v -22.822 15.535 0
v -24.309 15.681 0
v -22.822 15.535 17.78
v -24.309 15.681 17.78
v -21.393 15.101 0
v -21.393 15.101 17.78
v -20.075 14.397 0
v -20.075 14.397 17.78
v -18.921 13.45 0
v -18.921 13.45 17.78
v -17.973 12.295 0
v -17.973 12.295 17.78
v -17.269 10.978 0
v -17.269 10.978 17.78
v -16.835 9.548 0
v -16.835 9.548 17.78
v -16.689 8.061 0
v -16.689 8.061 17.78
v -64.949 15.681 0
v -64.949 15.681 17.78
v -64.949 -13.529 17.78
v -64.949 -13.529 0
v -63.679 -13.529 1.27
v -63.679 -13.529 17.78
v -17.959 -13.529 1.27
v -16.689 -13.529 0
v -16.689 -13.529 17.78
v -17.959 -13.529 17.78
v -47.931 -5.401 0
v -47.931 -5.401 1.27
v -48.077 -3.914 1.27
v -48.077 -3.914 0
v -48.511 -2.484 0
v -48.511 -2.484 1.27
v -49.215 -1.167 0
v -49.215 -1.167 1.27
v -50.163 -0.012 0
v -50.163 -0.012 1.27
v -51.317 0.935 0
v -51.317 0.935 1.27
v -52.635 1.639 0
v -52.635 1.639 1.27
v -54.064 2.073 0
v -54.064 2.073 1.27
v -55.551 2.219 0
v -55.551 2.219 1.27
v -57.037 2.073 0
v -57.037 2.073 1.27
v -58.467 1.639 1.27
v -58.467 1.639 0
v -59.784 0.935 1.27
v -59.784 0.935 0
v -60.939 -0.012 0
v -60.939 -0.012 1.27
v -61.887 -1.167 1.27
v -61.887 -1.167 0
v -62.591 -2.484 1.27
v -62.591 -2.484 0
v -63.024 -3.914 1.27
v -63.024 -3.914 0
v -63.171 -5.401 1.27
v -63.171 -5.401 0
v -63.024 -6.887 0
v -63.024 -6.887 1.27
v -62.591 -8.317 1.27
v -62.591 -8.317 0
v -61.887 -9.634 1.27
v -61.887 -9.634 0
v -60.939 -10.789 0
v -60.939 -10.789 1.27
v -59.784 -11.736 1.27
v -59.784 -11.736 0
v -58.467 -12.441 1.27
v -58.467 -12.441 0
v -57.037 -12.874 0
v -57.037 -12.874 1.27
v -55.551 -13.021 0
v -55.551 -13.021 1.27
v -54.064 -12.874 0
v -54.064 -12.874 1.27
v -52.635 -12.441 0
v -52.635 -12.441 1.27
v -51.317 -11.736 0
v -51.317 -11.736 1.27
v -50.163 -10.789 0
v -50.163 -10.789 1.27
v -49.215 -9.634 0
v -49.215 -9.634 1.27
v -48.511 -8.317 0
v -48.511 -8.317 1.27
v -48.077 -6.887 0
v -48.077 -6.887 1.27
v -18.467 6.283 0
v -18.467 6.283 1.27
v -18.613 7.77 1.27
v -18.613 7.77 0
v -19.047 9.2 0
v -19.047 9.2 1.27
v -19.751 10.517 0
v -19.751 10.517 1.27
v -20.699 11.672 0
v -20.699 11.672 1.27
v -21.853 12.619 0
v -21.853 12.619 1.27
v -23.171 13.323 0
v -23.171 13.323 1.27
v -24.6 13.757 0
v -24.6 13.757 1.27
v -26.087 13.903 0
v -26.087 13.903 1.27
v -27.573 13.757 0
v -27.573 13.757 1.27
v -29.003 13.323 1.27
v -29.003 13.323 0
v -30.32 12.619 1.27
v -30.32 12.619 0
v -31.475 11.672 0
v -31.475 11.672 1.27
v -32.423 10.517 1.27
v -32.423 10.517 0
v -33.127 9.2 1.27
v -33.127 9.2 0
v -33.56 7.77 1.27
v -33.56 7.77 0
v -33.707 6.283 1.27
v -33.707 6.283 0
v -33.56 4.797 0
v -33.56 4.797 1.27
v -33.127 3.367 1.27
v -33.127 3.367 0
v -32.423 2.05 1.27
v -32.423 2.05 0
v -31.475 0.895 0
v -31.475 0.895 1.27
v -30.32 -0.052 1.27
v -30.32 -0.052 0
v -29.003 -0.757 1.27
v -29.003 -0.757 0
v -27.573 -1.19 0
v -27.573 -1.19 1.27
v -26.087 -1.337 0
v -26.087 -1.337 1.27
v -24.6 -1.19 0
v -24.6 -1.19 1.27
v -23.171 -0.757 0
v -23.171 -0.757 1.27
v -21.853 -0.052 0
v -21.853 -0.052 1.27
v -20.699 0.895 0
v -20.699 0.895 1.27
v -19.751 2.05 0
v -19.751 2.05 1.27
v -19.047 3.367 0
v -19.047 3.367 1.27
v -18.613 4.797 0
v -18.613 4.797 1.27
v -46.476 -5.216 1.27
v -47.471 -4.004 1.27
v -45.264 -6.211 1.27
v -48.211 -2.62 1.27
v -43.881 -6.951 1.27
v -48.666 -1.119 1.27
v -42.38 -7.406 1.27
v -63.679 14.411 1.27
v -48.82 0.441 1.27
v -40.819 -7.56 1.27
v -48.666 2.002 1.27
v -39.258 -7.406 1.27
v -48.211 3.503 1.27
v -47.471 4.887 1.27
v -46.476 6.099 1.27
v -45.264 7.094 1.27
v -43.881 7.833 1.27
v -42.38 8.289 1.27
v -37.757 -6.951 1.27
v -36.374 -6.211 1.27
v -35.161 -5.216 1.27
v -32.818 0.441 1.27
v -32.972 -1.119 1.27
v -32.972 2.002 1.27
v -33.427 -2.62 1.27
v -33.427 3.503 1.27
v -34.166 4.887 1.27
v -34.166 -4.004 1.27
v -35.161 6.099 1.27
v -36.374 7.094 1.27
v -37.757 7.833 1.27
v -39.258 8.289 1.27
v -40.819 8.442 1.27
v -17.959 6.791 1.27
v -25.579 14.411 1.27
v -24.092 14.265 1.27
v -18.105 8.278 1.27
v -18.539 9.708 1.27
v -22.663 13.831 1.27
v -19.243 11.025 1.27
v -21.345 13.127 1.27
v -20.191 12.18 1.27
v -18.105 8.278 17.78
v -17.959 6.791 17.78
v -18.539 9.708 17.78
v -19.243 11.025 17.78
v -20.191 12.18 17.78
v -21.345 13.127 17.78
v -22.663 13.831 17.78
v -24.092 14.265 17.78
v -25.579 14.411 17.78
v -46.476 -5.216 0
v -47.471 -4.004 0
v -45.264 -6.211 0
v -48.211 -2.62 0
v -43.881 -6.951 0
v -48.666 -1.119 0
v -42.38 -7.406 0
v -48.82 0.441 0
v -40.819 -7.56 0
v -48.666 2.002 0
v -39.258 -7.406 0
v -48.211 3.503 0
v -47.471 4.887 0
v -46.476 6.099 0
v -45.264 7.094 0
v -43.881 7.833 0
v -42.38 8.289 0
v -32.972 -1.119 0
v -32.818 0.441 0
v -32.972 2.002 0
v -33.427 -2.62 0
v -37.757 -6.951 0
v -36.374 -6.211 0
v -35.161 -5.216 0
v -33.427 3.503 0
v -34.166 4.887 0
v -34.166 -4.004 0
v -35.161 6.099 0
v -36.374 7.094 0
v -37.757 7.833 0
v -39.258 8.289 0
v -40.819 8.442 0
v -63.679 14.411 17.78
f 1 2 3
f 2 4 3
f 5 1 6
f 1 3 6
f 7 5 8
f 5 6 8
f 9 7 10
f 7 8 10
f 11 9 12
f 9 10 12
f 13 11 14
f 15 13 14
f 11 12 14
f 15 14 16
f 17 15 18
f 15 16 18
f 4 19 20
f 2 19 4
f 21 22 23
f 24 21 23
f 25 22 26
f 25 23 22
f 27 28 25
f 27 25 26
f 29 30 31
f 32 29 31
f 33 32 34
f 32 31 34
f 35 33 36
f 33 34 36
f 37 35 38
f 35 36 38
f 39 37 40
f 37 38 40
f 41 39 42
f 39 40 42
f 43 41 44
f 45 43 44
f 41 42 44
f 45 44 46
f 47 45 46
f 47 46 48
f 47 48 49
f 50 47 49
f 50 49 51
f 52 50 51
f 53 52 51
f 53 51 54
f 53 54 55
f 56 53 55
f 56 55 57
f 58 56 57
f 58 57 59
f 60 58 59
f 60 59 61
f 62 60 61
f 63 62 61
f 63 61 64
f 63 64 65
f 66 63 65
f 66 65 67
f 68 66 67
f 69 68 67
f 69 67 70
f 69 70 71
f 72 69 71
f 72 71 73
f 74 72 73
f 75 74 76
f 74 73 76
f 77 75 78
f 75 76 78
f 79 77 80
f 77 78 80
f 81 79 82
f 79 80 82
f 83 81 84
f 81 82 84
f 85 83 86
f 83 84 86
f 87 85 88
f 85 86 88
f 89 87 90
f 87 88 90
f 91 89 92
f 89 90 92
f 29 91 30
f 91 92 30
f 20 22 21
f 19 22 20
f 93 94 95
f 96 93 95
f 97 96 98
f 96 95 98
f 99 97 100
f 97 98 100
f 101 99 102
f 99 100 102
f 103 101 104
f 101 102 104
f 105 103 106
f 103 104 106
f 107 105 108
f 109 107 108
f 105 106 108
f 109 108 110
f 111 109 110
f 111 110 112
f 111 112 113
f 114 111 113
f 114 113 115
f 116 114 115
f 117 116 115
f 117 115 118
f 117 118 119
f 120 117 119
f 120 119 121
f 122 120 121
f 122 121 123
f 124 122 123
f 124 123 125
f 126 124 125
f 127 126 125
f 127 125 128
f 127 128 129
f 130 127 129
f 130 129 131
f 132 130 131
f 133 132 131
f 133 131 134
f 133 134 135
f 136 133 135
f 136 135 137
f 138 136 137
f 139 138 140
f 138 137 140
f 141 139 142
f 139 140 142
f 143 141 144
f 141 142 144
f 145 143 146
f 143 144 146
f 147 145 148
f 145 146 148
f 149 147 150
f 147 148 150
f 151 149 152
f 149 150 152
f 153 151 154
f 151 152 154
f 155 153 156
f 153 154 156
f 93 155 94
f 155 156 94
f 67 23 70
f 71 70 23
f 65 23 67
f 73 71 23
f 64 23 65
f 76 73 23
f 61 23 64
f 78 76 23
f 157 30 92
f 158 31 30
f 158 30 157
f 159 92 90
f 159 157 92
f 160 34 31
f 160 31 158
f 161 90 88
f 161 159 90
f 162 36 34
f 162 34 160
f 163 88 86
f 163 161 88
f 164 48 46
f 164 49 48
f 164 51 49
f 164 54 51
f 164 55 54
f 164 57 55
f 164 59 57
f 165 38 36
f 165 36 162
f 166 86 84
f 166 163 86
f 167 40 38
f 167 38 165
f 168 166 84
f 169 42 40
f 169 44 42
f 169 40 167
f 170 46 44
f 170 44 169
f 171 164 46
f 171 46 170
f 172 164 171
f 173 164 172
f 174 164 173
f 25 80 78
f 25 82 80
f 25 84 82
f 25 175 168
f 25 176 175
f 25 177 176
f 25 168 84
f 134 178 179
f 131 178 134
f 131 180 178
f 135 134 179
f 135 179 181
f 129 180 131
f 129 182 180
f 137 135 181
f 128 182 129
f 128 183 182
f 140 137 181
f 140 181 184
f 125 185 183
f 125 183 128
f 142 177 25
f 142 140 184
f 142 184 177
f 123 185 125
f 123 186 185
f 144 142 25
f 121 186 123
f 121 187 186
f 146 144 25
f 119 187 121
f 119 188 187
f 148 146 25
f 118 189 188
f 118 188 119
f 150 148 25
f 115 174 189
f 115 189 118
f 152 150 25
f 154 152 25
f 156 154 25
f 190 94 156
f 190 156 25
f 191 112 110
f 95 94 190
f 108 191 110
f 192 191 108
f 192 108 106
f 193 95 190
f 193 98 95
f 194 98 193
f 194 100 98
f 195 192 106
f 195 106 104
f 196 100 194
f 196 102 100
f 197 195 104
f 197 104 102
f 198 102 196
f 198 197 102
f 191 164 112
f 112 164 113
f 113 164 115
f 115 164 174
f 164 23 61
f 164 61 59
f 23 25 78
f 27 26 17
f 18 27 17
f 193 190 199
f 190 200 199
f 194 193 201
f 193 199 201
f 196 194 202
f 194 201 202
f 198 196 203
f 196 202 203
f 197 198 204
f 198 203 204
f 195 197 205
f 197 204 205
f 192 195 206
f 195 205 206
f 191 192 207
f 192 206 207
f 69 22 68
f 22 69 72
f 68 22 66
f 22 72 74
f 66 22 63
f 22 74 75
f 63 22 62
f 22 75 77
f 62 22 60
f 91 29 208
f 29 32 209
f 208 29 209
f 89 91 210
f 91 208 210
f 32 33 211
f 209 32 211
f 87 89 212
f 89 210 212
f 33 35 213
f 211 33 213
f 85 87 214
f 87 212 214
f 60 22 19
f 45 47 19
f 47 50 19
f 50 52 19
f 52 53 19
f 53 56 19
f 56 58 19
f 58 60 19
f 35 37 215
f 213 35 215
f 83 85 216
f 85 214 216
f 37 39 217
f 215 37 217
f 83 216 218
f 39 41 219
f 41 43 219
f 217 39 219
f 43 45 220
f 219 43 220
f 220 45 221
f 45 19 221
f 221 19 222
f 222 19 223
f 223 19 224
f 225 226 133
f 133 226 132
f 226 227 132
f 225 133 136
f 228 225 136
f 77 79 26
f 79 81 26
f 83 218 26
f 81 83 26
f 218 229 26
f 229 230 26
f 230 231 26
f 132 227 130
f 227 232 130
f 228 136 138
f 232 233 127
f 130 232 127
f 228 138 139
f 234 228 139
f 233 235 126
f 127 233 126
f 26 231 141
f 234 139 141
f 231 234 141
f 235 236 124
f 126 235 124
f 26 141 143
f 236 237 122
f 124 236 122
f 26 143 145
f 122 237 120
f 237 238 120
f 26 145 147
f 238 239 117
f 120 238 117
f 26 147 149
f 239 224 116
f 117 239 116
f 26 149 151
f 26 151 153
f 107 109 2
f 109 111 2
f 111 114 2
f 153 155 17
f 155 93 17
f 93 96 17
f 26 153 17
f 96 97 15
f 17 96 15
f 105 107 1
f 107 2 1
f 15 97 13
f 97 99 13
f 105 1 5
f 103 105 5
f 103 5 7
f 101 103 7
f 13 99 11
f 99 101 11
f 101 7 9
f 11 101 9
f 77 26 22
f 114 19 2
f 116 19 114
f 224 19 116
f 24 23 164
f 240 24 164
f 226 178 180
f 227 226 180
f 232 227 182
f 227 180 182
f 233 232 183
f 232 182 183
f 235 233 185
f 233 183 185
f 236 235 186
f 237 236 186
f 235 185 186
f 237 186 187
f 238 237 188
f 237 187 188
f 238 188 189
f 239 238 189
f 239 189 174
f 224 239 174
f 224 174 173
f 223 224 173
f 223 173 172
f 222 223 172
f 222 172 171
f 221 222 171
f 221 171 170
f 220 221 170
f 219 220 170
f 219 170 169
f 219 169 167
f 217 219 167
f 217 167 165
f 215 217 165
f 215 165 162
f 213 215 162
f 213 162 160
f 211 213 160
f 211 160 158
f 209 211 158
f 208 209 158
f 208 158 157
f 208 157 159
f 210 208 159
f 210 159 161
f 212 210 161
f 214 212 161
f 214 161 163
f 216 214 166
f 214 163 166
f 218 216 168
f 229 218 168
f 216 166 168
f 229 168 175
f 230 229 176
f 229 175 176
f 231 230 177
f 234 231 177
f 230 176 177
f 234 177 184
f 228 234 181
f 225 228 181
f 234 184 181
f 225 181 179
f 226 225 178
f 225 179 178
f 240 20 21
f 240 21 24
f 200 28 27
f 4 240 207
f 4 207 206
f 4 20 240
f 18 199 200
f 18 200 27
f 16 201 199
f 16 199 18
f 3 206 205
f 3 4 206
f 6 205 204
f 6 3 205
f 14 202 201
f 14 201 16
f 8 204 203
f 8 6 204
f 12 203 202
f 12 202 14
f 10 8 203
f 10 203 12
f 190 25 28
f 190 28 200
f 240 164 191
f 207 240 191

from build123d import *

# Parameters (mm, degrees)
F0_W     = 48.26
F0_H     = 30.48
F0_W_2   = 45.72
F0_H_2   = 27.94
F1_DEPTH = 17.78
F2_DEPTH = 1.27
F3_R     = 7.62
F5_W     = 48.26
F5_H     = 17.78
F6_DEPTH = 1.27
F4_R     = 8.001
F4_R_2   = 7.62
F7_DEPTH = 12.1666


with BuildPart() as f1:
    # F0 (on Top) → F1 (new body)
    with BuildSketch(Plane.XY):
        with Locations((-40.818777, 0.441459)):
            Rectangle(F0_W, F0_H)
        with Locations((-40.818777, 0.441459)):
            Rectangle(F0_W_2, F0_H_2, mode=Mode.SUBTRACT)
    extrude(amount=F1_DEPTH)

    # F0 (on Top) → F2 (join)
    with BuildSketch(Plane.XY):
        with Locations((-40.818777, 0.441459)):
            Rectangle(F0_W_2, F0_H_2)
    extrude(amount=F2_DEPTH)

    # F3
    f3_edges = [f1.edges().sort_by_distance(p)[0] for p in [
        (-16.688777, 15.681459, 8.89),
        (-17.958777, 14.411459, 9.525),
    ]]
    fillet(f3_edges, radius=F3_R)

    # F5 (on face) → F6 (cut)
    with BuildSketch(Plane.XZ.offset(14.798541)):
        with Locations((-40.818777, 8.89)):
            Rectangle(F5_W, F5_H)
    extrude(amount=-F6_DEPTH, mode=Mode.SUBTRACT)

    # F4 (on face) → F7 (cut)
    with BuildSketch(Plane.XY.offset(1.27)):
        with Locations((-40.818777, 0.441459)):
            Circle(F4_R)
        with Locations((-26.086777, 6.283459)):
            Circle(F4_R_2)
        with Locations((-55.550777, -5.400541)):
            Circle(F4_R_2)
    extrude(amount=-F7_DEPTH, mode=Mode.SUBTRACT)


solid = f1.part
